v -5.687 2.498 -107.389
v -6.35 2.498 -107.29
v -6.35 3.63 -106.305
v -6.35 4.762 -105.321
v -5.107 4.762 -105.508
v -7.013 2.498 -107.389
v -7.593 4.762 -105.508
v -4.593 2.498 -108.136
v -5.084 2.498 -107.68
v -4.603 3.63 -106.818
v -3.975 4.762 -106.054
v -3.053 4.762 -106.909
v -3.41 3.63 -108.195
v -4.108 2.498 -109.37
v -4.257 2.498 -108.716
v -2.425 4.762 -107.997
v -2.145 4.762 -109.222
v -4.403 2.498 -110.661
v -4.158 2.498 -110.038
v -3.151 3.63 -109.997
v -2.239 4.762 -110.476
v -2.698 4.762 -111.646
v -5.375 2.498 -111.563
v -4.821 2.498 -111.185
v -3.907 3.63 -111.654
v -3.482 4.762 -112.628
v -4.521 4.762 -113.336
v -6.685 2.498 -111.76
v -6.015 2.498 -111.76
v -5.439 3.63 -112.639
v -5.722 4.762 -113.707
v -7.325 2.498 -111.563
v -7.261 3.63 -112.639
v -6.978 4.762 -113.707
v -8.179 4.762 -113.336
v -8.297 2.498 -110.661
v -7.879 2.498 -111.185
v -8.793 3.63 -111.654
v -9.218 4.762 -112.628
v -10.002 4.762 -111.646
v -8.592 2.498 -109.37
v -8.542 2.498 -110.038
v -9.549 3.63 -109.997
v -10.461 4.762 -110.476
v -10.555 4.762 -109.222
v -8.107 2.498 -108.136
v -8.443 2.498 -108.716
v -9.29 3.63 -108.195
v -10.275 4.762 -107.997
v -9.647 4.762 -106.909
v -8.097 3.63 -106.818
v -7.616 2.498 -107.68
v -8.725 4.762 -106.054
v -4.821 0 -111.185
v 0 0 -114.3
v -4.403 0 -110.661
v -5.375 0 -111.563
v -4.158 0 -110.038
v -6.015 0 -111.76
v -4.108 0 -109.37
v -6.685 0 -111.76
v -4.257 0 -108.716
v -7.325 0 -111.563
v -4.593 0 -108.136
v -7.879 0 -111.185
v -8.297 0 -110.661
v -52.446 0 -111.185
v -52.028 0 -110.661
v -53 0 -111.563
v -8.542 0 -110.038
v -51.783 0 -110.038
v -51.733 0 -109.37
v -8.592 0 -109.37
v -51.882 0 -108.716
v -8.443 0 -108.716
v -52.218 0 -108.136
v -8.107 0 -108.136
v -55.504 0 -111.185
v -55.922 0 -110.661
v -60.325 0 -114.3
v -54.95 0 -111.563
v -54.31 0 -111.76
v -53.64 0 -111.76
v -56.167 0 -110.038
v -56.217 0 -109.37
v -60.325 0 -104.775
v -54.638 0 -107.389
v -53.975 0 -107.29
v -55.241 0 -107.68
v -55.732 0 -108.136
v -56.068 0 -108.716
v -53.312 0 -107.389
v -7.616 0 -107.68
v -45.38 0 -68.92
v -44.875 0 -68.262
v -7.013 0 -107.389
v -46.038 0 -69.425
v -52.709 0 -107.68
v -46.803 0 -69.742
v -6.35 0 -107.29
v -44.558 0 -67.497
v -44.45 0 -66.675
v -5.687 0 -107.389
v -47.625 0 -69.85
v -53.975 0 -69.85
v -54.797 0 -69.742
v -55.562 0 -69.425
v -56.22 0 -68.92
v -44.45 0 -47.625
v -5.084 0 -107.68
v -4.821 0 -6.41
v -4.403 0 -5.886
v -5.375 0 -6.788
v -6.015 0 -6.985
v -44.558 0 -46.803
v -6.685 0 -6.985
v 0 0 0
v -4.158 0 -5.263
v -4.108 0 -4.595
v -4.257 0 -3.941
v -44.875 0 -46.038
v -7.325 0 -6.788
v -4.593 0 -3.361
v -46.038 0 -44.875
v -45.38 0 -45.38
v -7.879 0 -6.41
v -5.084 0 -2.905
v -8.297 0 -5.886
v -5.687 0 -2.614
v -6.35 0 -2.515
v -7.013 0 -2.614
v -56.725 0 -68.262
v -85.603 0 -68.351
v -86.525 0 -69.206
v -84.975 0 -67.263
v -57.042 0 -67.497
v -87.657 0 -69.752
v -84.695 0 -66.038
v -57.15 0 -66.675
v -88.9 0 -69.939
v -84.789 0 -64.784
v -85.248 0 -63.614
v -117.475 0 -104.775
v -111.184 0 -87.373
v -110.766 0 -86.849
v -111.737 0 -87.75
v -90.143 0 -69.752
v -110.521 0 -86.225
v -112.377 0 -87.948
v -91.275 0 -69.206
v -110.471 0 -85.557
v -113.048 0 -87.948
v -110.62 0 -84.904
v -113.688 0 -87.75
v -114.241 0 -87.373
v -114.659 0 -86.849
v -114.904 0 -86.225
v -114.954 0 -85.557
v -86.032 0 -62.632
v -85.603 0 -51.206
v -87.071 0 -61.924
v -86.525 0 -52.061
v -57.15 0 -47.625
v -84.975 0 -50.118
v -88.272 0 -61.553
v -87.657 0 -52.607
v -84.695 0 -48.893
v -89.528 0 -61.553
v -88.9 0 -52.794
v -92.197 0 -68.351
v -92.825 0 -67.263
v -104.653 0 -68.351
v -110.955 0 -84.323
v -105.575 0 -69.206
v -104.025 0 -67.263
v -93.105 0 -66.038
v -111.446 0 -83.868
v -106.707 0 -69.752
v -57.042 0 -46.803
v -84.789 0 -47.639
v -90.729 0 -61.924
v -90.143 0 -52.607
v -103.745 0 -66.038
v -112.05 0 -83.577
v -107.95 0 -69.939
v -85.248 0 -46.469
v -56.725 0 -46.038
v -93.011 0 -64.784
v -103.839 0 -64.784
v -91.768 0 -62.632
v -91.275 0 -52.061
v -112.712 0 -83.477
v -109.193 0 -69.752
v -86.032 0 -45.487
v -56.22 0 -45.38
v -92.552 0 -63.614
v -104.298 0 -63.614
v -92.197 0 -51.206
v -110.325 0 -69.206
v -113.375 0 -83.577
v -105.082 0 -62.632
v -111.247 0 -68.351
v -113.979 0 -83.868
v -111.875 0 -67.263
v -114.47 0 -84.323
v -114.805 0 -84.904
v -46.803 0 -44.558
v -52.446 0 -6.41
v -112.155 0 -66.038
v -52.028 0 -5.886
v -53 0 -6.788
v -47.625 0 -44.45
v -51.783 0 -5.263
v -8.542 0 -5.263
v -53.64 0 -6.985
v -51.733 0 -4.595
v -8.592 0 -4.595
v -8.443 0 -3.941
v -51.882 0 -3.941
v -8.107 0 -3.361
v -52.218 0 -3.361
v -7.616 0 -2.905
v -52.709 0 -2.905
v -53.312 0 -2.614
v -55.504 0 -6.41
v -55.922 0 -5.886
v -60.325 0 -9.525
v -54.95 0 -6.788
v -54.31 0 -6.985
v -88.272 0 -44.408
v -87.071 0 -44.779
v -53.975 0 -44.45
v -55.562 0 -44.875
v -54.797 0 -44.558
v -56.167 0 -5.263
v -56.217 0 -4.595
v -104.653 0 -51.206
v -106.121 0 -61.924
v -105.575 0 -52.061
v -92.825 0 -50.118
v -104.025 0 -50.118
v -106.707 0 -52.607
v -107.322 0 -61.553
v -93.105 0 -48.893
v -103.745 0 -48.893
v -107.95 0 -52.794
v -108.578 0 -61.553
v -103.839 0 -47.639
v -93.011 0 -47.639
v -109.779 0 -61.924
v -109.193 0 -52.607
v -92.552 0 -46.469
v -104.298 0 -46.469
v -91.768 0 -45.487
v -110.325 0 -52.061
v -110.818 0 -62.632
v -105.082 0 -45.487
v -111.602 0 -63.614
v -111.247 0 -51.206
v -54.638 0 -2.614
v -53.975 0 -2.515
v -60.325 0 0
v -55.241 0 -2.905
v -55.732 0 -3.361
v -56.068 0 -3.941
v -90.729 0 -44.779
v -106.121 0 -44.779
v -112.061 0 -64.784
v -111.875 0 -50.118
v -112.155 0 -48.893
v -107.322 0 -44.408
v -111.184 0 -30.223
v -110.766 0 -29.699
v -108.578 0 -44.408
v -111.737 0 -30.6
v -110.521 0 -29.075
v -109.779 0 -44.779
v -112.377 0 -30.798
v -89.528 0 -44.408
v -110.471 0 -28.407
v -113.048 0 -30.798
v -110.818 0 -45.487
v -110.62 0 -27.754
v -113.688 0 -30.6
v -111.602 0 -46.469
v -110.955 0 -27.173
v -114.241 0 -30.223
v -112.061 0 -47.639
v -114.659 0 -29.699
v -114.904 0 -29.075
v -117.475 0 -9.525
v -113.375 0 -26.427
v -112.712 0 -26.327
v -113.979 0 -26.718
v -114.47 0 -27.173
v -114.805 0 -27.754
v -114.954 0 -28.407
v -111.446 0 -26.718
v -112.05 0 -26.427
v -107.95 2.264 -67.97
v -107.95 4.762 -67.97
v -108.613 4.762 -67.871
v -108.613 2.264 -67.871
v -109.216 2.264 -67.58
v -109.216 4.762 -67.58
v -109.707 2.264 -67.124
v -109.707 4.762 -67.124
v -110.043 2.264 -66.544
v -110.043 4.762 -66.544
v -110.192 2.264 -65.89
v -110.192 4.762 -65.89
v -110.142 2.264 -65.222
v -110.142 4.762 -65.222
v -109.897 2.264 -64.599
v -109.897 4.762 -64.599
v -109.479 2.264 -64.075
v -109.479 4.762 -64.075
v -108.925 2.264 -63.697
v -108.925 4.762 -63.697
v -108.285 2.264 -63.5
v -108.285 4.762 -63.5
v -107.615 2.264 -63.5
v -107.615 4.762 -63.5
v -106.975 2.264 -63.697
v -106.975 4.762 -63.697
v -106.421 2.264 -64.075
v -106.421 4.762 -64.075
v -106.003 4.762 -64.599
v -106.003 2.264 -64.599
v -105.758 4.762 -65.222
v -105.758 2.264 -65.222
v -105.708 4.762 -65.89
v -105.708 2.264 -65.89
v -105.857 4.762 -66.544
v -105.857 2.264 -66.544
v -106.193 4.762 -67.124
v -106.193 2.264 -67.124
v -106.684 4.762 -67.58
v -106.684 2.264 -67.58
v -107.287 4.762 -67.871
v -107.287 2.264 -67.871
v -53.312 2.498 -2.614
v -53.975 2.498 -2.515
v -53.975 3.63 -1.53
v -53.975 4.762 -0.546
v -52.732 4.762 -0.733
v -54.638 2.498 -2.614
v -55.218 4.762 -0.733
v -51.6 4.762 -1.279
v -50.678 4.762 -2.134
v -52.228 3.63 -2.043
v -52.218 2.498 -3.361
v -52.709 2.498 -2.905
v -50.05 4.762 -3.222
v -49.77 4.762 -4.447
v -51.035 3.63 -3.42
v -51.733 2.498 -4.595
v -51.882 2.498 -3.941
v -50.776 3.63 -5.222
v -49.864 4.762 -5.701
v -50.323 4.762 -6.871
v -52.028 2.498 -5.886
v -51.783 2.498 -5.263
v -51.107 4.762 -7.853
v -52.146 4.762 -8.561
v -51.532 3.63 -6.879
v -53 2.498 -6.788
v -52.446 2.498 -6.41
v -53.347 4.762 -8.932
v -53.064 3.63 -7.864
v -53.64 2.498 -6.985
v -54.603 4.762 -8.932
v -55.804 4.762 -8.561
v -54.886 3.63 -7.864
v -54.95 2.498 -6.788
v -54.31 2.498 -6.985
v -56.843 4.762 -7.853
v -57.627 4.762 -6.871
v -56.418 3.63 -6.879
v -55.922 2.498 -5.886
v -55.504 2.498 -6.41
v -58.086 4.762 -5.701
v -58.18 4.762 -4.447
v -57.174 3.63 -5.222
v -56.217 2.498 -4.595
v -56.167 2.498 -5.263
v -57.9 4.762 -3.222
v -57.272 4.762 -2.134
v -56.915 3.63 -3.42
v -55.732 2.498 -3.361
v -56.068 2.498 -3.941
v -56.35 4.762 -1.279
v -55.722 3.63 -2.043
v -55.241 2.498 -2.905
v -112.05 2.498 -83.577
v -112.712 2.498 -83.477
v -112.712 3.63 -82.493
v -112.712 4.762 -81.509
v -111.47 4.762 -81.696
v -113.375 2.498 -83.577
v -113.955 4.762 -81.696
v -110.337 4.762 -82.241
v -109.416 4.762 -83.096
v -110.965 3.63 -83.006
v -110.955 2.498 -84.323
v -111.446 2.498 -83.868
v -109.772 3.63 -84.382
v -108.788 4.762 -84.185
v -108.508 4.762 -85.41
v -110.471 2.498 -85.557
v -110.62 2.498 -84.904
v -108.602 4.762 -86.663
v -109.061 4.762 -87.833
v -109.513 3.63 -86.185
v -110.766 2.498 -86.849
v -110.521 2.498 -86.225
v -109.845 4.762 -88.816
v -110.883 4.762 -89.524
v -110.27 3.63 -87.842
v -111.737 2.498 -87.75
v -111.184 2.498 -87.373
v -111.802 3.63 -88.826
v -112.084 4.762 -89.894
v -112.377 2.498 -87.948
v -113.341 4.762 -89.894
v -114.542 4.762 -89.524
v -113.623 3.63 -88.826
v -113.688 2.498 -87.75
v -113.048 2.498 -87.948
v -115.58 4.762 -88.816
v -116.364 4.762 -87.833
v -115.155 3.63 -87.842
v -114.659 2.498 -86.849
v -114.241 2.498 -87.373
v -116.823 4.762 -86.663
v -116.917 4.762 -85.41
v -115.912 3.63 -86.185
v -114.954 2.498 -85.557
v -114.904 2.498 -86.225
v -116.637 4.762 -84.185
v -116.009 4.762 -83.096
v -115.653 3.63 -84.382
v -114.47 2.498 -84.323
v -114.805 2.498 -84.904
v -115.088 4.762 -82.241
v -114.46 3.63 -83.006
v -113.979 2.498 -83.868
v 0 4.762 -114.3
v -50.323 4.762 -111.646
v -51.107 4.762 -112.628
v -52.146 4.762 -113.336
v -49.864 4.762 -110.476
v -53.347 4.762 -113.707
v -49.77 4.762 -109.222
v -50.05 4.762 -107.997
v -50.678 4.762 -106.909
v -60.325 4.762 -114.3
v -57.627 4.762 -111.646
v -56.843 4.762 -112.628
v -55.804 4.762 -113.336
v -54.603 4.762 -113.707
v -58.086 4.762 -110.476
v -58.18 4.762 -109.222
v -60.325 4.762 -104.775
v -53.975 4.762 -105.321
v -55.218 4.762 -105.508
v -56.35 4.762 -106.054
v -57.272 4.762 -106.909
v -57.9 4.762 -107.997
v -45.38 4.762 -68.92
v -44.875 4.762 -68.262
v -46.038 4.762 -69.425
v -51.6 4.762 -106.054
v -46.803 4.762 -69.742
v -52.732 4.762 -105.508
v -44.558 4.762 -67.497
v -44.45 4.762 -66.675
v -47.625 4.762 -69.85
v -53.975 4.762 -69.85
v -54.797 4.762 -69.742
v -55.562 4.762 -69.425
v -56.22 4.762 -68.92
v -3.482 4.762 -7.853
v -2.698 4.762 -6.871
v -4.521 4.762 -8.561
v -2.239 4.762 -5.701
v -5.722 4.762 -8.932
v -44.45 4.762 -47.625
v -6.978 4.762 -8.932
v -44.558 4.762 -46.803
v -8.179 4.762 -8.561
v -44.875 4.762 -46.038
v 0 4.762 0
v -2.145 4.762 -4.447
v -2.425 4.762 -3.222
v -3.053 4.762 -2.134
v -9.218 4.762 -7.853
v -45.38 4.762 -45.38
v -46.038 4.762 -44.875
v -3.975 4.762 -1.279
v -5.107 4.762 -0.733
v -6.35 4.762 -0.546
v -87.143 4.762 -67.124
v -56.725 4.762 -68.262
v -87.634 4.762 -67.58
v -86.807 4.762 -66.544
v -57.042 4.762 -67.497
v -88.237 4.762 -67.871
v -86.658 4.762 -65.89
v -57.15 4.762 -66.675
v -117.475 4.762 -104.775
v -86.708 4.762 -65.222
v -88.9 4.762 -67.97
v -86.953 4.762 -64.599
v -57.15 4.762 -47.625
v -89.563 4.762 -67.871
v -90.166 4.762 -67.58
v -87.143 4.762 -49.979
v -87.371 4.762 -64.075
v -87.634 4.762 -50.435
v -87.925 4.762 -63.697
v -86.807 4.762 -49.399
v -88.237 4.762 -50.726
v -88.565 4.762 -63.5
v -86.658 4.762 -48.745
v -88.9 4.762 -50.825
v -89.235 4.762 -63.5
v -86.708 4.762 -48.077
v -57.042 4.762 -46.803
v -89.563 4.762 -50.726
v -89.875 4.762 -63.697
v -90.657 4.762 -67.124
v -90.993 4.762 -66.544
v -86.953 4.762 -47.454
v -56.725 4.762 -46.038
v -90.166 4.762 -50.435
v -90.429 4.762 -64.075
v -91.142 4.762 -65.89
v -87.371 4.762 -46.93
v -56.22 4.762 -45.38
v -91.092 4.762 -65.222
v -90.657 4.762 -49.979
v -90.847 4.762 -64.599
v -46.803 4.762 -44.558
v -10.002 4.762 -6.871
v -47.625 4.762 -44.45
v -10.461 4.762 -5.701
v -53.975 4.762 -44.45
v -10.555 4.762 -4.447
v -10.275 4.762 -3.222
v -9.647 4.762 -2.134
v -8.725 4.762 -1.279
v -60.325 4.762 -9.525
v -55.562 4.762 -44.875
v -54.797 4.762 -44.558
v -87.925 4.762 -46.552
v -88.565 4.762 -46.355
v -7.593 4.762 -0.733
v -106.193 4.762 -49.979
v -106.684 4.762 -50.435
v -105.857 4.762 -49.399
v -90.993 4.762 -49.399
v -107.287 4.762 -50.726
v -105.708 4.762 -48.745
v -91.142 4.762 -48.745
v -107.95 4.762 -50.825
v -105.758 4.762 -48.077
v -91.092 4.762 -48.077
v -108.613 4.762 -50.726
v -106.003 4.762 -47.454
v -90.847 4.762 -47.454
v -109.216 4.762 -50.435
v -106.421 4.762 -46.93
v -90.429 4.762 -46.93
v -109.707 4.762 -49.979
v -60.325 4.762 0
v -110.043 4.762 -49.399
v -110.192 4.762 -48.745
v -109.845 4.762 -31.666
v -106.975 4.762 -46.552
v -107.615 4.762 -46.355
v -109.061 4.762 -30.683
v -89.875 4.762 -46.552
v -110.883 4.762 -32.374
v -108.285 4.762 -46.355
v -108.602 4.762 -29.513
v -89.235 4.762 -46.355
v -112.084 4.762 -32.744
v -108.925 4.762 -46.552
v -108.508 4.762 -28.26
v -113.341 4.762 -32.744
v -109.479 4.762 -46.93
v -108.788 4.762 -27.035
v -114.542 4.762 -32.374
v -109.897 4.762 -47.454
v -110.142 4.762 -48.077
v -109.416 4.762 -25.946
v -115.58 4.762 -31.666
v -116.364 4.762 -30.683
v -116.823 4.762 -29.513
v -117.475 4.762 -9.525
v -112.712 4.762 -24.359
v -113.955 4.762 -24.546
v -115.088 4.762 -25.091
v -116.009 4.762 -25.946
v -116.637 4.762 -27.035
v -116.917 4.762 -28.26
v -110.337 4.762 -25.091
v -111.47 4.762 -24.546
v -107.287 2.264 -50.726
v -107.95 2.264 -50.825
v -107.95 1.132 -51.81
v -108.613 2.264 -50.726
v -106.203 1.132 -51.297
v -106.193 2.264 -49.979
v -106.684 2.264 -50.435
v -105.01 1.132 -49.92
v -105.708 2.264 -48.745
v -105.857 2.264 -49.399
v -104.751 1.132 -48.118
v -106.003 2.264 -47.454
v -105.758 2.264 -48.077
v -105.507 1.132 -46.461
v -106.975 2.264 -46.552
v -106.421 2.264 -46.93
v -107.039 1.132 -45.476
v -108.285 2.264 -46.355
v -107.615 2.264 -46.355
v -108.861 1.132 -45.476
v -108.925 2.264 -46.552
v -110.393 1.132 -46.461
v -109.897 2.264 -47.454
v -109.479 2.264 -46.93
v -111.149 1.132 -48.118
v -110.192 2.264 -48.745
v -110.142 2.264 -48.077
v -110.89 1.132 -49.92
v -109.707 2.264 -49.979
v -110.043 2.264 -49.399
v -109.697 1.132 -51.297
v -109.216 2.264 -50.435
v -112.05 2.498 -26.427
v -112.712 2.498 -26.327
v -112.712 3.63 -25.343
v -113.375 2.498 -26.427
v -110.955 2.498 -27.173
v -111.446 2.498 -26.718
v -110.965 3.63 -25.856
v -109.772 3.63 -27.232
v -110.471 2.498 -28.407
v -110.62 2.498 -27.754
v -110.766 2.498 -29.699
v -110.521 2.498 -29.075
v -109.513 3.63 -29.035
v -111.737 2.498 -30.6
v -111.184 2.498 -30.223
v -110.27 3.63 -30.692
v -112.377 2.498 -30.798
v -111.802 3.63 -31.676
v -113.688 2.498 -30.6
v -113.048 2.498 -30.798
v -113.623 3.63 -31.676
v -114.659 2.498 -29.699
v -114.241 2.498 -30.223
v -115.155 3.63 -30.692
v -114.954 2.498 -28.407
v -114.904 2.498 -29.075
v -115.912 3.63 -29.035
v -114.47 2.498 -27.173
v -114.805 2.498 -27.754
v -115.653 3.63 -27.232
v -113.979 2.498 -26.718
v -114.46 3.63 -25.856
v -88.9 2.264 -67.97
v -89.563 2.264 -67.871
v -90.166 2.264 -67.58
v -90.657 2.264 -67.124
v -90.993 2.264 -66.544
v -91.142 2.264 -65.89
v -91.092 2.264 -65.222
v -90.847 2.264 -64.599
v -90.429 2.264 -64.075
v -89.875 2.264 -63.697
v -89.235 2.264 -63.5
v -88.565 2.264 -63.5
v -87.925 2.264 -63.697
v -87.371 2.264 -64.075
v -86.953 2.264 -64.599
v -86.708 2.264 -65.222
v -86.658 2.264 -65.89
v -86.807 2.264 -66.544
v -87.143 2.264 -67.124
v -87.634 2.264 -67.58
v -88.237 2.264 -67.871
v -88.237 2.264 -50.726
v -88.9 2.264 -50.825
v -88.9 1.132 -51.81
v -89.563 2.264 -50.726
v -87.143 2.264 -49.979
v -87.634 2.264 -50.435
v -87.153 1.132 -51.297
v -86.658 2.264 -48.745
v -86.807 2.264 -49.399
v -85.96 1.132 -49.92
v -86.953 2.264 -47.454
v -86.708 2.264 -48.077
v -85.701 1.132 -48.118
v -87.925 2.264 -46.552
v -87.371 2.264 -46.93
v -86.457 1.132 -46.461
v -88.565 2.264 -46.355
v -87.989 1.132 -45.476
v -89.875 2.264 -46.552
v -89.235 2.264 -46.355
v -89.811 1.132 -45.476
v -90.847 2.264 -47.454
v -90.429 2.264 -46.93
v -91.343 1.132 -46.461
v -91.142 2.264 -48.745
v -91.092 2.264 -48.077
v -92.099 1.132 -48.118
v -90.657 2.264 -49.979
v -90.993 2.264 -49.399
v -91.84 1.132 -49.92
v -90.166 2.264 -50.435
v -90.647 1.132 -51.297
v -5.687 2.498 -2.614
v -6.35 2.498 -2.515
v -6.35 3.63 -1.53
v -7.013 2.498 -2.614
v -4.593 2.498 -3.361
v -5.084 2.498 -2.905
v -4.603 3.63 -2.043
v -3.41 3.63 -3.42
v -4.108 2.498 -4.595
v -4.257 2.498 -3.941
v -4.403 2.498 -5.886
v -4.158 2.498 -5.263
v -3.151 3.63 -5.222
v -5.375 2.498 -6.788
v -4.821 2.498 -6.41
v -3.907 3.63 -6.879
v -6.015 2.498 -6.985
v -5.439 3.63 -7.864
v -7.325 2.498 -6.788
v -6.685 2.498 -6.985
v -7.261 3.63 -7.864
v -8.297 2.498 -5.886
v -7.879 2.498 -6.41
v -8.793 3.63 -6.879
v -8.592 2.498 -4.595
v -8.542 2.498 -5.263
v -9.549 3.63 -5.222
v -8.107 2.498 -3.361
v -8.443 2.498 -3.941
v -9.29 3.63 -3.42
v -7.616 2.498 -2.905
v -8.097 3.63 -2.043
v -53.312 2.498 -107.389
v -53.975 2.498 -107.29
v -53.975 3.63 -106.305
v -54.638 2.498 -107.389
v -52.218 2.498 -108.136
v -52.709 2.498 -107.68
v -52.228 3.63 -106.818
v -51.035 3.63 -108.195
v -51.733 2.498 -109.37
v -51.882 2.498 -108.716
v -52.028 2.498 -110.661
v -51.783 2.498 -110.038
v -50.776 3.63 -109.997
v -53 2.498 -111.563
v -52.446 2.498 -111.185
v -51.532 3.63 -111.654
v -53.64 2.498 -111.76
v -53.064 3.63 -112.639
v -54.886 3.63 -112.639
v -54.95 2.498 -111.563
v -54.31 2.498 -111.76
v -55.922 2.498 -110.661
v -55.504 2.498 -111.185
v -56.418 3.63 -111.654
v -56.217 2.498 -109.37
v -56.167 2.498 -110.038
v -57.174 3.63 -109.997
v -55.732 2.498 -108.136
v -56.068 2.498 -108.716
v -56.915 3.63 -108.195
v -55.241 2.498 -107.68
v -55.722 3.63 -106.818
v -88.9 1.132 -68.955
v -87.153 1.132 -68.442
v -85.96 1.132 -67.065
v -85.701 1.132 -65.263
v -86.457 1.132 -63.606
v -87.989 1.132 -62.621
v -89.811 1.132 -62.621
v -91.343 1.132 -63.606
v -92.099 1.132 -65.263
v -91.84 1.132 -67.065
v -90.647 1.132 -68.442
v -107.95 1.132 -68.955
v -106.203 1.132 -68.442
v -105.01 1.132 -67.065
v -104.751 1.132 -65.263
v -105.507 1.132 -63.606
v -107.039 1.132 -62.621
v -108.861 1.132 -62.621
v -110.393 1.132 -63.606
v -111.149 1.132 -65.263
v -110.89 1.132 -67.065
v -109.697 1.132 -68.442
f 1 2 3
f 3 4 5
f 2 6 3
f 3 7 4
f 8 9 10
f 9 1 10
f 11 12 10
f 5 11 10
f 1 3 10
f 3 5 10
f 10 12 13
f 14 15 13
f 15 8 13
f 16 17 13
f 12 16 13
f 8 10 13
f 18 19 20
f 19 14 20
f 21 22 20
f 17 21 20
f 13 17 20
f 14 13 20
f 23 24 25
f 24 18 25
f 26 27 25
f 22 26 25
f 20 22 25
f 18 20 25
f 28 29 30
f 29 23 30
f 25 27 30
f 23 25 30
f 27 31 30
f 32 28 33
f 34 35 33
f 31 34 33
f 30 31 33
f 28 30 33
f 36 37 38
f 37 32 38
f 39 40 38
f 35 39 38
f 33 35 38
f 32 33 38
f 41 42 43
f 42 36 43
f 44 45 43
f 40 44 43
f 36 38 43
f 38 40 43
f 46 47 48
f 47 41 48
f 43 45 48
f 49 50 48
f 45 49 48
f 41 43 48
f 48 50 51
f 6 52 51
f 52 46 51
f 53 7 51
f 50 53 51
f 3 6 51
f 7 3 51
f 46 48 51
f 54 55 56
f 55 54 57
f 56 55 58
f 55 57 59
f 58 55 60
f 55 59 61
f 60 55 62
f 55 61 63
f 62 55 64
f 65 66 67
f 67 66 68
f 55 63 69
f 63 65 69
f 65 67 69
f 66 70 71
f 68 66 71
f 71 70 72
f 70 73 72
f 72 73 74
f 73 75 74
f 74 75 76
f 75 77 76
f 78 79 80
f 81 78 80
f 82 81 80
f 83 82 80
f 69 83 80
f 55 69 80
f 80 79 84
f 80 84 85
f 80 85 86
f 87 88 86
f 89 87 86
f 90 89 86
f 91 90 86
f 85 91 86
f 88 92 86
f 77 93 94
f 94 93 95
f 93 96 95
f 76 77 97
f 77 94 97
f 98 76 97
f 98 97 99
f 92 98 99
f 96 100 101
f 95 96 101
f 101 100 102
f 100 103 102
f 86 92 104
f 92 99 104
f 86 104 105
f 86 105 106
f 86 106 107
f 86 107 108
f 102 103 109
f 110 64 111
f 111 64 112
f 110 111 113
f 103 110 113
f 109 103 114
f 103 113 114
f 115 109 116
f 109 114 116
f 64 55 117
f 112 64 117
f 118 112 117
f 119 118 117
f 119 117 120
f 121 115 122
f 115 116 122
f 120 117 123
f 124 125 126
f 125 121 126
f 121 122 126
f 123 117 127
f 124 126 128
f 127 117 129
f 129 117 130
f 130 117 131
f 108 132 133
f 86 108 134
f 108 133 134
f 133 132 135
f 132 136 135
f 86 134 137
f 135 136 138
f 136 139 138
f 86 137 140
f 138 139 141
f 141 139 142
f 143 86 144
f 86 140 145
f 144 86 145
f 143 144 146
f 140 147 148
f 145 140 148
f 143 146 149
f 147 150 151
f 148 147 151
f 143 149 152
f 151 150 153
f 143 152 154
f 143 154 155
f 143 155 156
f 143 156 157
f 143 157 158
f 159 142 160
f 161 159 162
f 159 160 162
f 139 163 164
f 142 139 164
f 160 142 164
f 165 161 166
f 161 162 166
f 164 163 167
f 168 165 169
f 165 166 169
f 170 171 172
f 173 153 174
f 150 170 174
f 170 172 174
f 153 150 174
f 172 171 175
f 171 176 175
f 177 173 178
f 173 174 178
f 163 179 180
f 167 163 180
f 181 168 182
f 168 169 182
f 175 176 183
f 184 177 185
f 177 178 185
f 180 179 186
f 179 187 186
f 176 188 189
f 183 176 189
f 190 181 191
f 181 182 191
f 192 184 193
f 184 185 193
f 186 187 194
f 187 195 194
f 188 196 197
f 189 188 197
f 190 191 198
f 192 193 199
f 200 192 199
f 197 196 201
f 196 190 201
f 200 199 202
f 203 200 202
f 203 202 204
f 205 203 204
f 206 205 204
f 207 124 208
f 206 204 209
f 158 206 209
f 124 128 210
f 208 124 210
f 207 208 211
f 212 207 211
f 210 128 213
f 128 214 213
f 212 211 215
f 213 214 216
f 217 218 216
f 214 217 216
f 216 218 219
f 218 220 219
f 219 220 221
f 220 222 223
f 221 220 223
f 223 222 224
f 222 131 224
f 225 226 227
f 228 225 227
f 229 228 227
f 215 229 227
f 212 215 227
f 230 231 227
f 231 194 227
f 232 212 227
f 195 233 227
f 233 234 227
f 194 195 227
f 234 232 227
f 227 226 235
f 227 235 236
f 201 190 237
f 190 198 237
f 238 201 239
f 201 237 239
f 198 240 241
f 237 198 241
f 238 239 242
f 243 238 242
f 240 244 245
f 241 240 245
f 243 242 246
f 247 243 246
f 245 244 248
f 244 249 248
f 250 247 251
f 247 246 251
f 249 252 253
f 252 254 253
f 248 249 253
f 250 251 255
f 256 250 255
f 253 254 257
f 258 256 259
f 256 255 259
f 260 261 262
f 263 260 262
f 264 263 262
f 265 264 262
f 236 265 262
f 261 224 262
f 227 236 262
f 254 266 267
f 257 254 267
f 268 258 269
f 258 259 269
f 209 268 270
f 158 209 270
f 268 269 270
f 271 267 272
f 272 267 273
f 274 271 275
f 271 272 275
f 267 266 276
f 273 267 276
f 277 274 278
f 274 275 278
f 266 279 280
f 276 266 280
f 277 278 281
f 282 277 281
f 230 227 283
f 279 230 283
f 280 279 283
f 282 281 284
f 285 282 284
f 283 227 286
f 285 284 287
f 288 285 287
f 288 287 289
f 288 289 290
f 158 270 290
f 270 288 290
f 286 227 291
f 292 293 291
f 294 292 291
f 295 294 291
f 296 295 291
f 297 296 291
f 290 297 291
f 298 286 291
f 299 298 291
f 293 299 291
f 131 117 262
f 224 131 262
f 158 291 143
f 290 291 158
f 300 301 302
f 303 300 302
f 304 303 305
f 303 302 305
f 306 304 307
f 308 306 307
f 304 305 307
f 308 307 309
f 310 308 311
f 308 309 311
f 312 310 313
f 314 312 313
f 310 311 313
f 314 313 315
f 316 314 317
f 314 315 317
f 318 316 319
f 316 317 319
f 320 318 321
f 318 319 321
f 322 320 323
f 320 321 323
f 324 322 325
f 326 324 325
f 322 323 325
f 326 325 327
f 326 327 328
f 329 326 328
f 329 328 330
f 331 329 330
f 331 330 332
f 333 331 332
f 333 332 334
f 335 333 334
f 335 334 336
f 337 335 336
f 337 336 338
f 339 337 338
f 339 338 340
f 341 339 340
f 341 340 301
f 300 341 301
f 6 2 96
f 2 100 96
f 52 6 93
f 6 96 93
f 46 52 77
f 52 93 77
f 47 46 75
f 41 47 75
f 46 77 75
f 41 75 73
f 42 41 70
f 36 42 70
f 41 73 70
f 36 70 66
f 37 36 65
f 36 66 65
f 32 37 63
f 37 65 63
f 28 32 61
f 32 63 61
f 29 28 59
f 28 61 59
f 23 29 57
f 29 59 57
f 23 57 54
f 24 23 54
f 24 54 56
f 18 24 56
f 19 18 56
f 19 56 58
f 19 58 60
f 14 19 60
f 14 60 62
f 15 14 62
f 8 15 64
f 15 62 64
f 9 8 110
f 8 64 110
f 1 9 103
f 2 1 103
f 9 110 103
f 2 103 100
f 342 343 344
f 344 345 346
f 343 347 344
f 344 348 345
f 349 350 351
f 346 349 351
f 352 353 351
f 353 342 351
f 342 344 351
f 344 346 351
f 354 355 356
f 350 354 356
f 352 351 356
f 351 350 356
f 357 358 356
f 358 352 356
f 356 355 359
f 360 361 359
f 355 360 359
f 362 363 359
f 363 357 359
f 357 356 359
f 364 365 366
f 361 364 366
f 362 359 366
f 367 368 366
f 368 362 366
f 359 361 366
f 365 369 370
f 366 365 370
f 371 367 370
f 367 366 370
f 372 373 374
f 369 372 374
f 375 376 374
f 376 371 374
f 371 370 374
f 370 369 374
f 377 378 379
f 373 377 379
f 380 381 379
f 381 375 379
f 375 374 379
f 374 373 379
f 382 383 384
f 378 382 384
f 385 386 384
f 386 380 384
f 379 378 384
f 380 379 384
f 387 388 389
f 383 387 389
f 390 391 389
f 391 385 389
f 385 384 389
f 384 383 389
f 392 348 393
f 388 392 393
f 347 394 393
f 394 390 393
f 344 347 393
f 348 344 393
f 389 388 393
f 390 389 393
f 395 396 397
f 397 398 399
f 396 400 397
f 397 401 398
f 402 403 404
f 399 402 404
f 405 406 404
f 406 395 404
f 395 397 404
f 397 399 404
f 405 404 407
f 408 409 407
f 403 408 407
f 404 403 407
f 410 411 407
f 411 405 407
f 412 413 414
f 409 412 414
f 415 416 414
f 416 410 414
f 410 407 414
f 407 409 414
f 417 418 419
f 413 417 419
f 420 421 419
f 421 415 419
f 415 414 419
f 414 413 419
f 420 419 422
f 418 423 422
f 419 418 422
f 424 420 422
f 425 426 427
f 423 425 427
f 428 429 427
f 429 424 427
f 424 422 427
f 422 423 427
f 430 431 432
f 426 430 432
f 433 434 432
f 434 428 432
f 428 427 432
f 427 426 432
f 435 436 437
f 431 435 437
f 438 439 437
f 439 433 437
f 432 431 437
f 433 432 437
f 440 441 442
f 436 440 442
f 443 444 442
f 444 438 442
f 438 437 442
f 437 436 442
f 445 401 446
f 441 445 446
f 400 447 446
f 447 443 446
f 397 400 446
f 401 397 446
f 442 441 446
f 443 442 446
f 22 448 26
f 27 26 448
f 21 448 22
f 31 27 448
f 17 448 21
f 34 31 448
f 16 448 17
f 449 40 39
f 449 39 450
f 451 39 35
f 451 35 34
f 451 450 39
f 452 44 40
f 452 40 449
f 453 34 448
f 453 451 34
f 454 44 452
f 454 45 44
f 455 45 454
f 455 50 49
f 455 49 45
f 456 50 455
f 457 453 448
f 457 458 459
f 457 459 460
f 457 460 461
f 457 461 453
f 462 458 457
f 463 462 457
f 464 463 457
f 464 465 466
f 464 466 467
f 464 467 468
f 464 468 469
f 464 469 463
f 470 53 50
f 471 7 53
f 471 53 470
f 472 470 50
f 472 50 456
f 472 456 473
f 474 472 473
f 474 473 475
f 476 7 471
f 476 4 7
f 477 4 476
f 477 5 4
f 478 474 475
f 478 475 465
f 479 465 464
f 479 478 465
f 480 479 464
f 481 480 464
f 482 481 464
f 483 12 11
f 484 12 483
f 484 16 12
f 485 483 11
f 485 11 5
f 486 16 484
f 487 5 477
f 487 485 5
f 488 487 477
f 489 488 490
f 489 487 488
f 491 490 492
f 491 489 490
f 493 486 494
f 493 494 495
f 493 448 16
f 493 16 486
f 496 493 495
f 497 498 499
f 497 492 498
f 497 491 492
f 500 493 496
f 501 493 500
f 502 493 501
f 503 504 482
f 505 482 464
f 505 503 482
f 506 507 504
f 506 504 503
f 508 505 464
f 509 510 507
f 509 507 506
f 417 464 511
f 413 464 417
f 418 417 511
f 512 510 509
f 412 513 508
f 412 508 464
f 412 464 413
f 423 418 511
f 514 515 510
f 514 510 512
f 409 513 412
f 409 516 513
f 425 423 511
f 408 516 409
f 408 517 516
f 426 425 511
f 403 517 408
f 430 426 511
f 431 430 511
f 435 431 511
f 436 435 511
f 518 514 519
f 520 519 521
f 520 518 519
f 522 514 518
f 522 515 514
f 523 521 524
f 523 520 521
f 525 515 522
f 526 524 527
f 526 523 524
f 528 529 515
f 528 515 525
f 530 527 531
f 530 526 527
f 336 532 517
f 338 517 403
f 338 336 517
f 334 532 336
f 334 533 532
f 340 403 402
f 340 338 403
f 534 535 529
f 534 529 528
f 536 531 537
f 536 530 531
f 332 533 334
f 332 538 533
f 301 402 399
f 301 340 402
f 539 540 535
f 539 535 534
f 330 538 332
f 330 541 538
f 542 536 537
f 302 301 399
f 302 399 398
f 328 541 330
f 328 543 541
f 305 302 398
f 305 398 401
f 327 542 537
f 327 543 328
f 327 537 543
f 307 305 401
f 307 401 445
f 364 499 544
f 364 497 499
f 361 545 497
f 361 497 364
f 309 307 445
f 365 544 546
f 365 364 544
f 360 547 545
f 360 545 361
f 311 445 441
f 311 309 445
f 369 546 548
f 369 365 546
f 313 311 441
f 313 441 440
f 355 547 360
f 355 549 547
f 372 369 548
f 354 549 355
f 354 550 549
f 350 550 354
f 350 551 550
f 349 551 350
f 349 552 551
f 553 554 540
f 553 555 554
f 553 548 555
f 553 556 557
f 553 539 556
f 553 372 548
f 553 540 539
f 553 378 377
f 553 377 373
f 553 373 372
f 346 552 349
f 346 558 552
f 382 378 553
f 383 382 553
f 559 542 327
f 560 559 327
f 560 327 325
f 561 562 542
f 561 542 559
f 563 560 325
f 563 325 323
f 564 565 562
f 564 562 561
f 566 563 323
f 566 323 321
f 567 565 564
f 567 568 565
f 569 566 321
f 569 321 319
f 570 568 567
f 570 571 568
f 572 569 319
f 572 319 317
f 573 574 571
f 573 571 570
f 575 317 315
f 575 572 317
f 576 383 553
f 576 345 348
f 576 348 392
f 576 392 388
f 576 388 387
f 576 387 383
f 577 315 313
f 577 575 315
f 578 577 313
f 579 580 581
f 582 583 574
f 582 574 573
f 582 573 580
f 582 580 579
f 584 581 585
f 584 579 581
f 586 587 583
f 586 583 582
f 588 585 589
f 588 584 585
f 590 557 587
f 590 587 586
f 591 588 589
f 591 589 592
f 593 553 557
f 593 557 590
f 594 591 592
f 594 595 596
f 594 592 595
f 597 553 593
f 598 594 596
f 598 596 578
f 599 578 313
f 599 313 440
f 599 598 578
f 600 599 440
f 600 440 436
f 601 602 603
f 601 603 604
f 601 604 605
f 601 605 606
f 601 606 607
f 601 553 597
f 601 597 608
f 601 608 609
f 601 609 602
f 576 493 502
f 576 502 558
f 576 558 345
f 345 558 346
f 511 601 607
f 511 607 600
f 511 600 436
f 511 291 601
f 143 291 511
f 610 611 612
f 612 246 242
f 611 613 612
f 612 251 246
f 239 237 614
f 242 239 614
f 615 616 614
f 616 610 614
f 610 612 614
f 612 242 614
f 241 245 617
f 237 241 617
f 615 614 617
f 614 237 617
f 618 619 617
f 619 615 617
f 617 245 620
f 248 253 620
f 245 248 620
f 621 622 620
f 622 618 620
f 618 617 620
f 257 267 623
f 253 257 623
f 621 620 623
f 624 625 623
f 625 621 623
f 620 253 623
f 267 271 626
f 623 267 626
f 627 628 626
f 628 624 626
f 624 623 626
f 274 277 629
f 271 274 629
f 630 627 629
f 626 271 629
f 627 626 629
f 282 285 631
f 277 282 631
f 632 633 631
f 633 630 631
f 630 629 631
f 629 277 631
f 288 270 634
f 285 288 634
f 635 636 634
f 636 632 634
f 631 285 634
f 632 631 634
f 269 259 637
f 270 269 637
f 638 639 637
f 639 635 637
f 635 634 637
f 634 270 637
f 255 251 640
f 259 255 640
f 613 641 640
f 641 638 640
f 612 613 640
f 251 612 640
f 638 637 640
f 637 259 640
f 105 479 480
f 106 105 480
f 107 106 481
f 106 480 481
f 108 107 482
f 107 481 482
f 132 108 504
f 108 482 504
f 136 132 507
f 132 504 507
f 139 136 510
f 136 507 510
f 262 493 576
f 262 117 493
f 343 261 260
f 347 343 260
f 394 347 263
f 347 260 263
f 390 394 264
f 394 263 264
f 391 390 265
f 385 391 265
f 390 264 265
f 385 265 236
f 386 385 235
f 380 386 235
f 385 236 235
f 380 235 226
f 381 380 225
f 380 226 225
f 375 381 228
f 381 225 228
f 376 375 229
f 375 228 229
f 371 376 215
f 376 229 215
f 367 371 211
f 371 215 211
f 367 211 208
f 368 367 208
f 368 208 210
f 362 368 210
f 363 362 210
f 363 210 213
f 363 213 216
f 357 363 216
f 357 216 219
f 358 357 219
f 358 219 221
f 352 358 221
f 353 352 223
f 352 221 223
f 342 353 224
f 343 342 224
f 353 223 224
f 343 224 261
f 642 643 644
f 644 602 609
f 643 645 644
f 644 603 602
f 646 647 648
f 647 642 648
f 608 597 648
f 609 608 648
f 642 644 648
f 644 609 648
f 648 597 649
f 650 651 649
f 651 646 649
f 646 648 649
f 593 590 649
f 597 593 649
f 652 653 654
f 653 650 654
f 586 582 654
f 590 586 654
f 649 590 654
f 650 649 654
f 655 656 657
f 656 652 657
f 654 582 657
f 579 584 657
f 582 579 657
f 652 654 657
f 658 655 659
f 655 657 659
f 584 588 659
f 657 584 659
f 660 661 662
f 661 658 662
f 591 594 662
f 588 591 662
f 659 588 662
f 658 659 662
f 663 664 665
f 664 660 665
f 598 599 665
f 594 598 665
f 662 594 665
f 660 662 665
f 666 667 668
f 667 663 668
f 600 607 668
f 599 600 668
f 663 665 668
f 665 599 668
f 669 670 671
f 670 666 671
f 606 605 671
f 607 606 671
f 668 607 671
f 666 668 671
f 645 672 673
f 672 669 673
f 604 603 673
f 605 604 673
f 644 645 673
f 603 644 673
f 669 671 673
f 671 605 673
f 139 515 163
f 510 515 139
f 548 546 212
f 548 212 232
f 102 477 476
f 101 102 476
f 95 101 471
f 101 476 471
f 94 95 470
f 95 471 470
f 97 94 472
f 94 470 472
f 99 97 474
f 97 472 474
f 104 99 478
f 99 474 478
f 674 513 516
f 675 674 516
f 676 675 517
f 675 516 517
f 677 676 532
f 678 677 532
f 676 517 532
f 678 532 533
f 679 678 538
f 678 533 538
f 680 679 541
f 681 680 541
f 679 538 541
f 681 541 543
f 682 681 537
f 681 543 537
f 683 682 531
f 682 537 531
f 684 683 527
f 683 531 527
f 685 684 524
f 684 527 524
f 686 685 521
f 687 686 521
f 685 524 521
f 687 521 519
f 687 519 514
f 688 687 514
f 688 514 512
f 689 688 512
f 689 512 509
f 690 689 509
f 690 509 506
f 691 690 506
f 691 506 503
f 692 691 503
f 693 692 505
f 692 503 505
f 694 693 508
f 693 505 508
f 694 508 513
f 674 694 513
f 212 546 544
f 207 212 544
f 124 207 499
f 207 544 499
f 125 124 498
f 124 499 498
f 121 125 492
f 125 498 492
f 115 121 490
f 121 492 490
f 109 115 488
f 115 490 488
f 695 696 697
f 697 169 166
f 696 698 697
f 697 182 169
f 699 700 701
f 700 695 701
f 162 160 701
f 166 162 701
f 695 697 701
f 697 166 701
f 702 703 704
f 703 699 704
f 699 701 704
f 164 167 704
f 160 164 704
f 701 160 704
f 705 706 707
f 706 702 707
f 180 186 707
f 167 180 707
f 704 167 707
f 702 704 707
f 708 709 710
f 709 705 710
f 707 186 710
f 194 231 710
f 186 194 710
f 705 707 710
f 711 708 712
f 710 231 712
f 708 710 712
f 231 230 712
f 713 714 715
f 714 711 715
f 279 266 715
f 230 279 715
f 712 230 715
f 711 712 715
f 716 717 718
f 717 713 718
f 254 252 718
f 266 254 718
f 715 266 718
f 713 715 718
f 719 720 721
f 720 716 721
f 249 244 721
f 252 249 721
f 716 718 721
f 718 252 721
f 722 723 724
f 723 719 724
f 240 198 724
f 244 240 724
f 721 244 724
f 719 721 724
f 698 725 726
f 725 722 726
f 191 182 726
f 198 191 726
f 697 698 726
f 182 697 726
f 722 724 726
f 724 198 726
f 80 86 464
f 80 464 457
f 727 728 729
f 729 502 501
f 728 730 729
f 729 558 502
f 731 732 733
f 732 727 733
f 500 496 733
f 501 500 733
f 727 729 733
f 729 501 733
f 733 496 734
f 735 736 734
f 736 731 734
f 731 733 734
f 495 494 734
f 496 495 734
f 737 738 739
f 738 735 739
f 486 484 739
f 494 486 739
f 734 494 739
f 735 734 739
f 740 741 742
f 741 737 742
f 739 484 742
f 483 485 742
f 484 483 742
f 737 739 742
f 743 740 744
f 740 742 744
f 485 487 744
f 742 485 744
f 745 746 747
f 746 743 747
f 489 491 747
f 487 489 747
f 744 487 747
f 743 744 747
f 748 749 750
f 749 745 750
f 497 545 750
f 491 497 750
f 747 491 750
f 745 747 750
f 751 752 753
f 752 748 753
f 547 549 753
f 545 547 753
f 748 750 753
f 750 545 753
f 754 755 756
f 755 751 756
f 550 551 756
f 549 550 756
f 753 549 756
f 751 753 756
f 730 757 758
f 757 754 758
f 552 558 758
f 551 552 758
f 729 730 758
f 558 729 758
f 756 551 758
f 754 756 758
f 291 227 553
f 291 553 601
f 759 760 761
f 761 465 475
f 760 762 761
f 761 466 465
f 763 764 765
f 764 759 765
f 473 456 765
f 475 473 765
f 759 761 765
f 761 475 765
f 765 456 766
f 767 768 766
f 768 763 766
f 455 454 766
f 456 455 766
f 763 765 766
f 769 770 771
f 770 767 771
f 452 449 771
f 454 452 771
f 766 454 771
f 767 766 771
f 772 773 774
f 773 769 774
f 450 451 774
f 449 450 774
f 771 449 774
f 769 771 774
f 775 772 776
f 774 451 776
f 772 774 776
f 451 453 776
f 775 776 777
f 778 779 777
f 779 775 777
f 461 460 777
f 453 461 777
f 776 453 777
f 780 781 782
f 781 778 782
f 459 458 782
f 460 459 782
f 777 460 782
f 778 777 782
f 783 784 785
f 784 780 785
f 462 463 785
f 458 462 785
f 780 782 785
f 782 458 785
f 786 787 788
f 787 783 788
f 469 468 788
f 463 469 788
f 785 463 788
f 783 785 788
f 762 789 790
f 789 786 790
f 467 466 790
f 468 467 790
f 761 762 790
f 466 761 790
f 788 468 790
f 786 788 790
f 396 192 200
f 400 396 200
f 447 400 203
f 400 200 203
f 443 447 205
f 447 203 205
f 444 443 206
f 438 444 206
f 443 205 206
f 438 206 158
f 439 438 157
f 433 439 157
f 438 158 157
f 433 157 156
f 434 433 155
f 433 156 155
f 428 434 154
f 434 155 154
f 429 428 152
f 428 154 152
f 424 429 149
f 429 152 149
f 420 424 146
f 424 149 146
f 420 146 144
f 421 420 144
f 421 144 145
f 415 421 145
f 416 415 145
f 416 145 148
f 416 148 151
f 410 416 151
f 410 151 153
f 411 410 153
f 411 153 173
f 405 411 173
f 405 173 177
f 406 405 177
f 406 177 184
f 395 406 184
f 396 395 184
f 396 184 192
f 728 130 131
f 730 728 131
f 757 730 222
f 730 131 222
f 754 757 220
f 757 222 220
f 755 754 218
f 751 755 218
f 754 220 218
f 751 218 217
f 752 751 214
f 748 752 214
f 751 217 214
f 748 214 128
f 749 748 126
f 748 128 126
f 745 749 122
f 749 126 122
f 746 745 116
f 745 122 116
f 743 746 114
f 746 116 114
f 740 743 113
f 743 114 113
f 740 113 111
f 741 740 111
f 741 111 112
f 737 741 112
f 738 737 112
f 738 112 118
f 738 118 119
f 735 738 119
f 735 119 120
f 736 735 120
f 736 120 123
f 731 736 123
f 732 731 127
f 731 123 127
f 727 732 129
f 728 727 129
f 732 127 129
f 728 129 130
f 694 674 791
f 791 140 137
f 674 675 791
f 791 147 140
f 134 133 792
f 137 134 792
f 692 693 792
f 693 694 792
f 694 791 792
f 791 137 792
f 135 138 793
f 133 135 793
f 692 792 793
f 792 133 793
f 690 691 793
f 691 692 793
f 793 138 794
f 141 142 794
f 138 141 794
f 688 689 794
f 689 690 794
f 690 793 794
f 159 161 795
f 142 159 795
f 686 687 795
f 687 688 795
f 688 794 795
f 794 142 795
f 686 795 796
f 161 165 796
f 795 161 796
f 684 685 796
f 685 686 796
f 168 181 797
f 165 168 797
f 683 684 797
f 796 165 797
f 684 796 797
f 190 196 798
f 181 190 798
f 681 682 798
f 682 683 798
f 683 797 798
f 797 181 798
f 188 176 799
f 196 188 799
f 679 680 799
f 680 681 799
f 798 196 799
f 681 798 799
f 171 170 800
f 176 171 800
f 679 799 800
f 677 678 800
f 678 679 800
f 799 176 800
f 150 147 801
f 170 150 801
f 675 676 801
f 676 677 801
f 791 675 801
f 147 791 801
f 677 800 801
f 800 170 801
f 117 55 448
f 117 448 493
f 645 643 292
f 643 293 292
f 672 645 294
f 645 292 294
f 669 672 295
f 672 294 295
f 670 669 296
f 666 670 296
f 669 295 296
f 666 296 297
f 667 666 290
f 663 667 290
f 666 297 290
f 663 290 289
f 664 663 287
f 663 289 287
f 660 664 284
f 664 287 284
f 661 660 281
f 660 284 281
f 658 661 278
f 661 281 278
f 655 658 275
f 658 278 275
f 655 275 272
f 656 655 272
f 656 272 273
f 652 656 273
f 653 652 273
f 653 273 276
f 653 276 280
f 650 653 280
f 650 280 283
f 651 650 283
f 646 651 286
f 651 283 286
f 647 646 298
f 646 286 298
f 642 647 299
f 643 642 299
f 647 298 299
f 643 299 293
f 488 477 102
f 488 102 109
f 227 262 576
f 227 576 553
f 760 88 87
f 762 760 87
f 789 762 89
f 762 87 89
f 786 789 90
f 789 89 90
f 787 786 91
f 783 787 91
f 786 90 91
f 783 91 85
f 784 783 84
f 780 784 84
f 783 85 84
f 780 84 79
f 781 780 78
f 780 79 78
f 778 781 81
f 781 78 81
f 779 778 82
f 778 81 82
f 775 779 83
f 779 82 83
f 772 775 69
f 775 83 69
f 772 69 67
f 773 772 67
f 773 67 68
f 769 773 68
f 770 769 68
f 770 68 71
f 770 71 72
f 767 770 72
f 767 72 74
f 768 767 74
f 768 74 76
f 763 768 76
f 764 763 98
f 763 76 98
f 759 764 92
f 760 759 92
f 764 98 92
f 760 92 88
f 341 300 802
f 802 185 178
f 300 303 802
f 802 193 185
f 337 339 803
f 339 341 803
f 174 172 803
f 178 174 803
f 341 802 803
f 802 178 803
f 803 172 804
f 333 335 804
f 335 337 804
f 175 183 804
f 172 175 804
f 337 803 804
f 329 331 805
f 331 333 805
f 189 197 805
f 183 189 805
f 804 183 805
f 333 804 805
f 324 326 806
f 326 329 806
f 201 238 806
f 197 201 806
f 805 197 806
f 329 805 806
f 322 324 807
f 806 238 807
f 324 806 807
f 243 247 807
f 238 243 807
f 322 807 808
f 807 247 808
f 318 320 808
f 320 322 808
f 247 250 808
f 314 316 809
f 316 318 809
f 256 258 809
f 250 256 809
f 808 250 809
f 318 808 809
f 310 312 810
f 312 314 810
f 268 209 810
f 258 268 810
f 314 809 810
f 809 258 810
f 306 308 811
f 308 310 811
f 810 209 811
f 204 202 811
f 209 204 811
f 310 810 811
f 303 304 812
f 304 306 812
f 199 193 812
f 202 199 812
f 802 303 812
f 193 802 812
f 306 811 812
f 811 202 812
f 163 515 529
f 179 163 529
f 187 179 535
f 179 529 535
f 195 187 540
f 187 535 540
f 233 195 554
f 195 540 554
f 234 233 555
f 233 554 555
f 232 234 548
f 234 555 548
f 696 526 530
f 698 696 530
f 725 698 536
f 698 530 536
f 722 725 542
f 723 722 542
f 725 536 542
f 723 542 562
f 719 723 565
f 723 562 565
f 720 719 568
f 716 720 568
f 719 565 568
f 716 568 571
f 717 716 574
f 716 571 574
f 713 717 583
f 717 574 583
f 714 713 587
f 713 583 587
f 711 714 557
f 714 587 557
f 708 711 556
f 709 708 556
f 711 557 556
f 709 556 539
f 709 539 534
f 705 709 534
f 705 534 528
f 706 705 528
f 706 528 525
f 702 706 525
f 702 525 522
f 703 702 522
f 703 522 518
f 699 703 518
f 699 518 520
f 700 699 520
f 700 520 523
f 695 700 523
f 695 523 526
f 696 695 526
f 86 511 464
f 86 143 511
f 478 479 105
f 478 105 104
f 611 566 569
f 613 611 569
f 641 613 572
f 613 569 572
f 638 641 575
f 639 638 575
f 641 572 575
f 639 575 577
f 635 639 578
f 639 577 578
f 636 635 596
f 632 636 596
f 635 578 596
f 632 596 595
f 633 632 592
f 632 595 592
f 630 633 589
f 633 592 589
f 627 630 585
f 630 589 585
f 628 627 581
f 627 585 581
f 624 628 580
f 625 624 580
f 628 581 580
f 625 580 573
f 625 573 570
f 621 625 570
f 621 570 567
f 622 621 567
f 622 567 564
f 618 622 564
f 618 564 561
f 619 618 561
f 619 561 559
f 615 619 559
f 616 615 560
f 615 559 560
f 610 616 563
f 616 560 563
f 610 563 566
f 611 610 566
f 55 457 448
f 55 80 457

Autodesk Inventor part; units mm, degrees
ref_plane "YZ Plane" through (0, 0, 0) normal (1, 0, 0) x (0, 1, 0)
ref_plane "XZ Plane" through (0, 0, 0) normal (0, 1, 0) x (-1, 0, 0)
ref_plane "XY Plane" through (0, 0, 0) normal (0, 0, 1) x (1, 0, 0)
sketch "Sketch1" plane through (0, 0, 0) normal (0, 1, 0) x (-1, 0, 0)
  line L0 (0, 0) -> (60.325, 0)
  line L1 (60.325, 0) -> (60.325, -9.525)
  line L2 (60.325, -9.525) -> (117.475, -9.525)
  line L3 (117.475, -9.525) -> (117.475, -104.775)
  line L4 (117.475, -104.775) -> (60.325, -104.775)
  line L5 (60.325, -104.775) -> (60.325, -114.3)
  line L6 (60.325, -114.3) -> (0, -114.3)
  line L7 (0, -114.3) -> (0, 0)
  dimension "d0" = 9.525
  dimension "d1" = 95.25
  dimension "d2" = 57.15
  dimension "d3" = 60.325
  dimension "d4" = 117.475
  dimension "d5" = 114.3
extrude "Extrusion1" add sketch "Sketch1" along normal blind 4.7625
sketch "Sketch2" plane through (0, 4.7625, 0) normal (0, 1, 0) x (1, 0, 0)
  line L0 (-117.475, 9.525) -> (-117.475, 104.775) construction
  line L1 (-117.475, 57.15) -> (0, 57.15) construction
  line L2 (-60.325, 0) -> (0, 0) construction
  line L3 (0, 0) -> (0, 114.3) construction
  line L4 (0, 114.3) -> (-60.325, 114.3) construction
  line L5 (-60.325, 114.3) -> (-60.325, 104.775) construction
  line L6 (-60.325, 104.775) -> (-117.475, 104.775) construction
  line L7 (-117.475, 104.775) -> (-117.475, 9.525) construction
  line L8 (-117.475, 9.525) -> (-60.325, 9.525) construction
  line L9 (-60.325, 9.525) -> (-60.325, 0) construction
  point P0 (-53.975, 4.7625)
  point P1 (-6.35, 4.7625)
  point P2 (-112.7125, 28.575)
  point P3 (-53.975, 109.5375)
  point P4 (-6.35, 109.5375)
  point P5 (-112.7125, 85.725)
  dimension "d8" = 6.35
  dimension "d9" = 6.35
  dimension "d10" = 4.7625
  dimension "d11" = 4.7625
  dimension "d12" = 19.05
  dimension "d13" = 4.7625
hole "Hole1" at (-53.975, 4.7625, -4.7625) at (-6.35, 4.7625, -4.7625) at (-112.7125, 4.7625, -28.575) at (-6.35, 4.7625, -109.5375) at (-53.975, 4.7625, -109.5375) at (-112.7125, 4.7625, -85.725) direction (0, -1, 0) diameter 4.4958 end through all countersink diameter 8.4328 countersink angle 82 clearance for "Flat Head Machine Screw (82)" size "#8" standard "Ansi Unified Screw Threads"
sketch "Sketch3" plane through (0, 0, 0) normal (0, -1, 0) x (1, 0, 0)
  circle A0 centre (-53.975, -109.5375) radius 2.2479 construction
  circle A1 centre (-112.7125, -28.575) radius 2.2479 construction
  circle A2 centre (-53.975, -4.7625) radius 2.2479 construction
  circle A3 centre (-6.35, -4.7625) radius 2.2479 construction
  circle A4 centre (-6.35, -109.5375) radius 2.2479 construction
  circle A5 centre (-112.7125, -85.725) radius 2.2479 construction
  line L0 (0, 0) -> (-60.325, 0) construction
  line L1 (-60.325, 0) -> (-60.325, -9.525) construction
  line L2 (-60.325, -9.525) -> (-117.475, -9.525) construction
  line L3 (-117.475, -9.525) -> (-117.475, -104.775) construction
  line L4 (-117.475, -104.775) -> (-60.325, -104.775) construction
  line L5 (-60.325, -104.775) -> (-60.325, -114.3) construction
  line L6 (-60.325, -114.3) -> (0, -114.3) construction
  line L7 (0, -114.3) -> (0, 0) construction
  line L8 (0, -57.15) -> (-117.475, -57.15) construction
  point P0 (-88.9, -48.5775)
  point P1 (-107.95, -48.5775)
  point P2 (-88.9, -65.7225)
  point P3 (-107.95, -65.7225)
  dimension "d22" = 19.05
  dimension "d23" = 8.5725
  dimension "d24" = 8.5725
  dimension "d32" = 9.525
hole "Hole2" at (-88.9, 0, -48.5775) at (-107.95, 0, -48.5775) at (-88.9, 0, -65.7225) at (-107.95, 0, -65.7225) direction (0, 1, 0) diameter 4.4958 end through all countersink diameter 8.4328 countersink angle 82 clearance for "Flat Head Machine Screw (82)" size "#8" standard "Ansi Unified Screw Threads"
sketch "Sketch4" plane through (0, 4.7625, 0) normal (0, 1, 0) x (1, 0, 0)
  line L0 (-47.625, 44.45) -> (-53.975, 44.45)
  line L1 (-57.15, 47.625) -> (-57.15, 66.675)
  line L2 (-53.975, 69.85) -> (-47.625, 69.85)
  line L3 (-44.45, 66.675) -> (-44.45, 47.625)
  line L4 (-44.45, 44.45) -> (-57.15, 69.85) construction
  line L5 (-57.15, 44.45) -> (-44.45, 69.85) construction
  line L6 (0, 0) -> (0, 114.3) projected
  line L7 (0, 57.15) -> (-50.8, 57.15) construction
  arc A0 (-53.975, 69.85) -> (-57.15, 66.675) centre (-53.975, 66.675) ccw
  arc A1 (-44.45, 66.675) -> (-47.625, 69.85) centre (-47.625, 66.675) ccw
  arc A2 (-47.625, 44.45) -> (-44.45, 47.625) centre (-47.625, 47.625) ccw
  arc A3 (-57.15, 47.625) -> (-53.975, 44.45) centre (-53.975, 47.625) ccw
  dimension "d33" = 50.8
  dimension "d34" = 12.7
  dimension "d35" = 25.4
  dimension "d36" = 3.175
extrude "Extrusion2" cut sketch "Sketch4" against normal through all
equation "\"d24\" = d23"
properties part number "ImagineFrameTopBot" material "SAN Plastic"
